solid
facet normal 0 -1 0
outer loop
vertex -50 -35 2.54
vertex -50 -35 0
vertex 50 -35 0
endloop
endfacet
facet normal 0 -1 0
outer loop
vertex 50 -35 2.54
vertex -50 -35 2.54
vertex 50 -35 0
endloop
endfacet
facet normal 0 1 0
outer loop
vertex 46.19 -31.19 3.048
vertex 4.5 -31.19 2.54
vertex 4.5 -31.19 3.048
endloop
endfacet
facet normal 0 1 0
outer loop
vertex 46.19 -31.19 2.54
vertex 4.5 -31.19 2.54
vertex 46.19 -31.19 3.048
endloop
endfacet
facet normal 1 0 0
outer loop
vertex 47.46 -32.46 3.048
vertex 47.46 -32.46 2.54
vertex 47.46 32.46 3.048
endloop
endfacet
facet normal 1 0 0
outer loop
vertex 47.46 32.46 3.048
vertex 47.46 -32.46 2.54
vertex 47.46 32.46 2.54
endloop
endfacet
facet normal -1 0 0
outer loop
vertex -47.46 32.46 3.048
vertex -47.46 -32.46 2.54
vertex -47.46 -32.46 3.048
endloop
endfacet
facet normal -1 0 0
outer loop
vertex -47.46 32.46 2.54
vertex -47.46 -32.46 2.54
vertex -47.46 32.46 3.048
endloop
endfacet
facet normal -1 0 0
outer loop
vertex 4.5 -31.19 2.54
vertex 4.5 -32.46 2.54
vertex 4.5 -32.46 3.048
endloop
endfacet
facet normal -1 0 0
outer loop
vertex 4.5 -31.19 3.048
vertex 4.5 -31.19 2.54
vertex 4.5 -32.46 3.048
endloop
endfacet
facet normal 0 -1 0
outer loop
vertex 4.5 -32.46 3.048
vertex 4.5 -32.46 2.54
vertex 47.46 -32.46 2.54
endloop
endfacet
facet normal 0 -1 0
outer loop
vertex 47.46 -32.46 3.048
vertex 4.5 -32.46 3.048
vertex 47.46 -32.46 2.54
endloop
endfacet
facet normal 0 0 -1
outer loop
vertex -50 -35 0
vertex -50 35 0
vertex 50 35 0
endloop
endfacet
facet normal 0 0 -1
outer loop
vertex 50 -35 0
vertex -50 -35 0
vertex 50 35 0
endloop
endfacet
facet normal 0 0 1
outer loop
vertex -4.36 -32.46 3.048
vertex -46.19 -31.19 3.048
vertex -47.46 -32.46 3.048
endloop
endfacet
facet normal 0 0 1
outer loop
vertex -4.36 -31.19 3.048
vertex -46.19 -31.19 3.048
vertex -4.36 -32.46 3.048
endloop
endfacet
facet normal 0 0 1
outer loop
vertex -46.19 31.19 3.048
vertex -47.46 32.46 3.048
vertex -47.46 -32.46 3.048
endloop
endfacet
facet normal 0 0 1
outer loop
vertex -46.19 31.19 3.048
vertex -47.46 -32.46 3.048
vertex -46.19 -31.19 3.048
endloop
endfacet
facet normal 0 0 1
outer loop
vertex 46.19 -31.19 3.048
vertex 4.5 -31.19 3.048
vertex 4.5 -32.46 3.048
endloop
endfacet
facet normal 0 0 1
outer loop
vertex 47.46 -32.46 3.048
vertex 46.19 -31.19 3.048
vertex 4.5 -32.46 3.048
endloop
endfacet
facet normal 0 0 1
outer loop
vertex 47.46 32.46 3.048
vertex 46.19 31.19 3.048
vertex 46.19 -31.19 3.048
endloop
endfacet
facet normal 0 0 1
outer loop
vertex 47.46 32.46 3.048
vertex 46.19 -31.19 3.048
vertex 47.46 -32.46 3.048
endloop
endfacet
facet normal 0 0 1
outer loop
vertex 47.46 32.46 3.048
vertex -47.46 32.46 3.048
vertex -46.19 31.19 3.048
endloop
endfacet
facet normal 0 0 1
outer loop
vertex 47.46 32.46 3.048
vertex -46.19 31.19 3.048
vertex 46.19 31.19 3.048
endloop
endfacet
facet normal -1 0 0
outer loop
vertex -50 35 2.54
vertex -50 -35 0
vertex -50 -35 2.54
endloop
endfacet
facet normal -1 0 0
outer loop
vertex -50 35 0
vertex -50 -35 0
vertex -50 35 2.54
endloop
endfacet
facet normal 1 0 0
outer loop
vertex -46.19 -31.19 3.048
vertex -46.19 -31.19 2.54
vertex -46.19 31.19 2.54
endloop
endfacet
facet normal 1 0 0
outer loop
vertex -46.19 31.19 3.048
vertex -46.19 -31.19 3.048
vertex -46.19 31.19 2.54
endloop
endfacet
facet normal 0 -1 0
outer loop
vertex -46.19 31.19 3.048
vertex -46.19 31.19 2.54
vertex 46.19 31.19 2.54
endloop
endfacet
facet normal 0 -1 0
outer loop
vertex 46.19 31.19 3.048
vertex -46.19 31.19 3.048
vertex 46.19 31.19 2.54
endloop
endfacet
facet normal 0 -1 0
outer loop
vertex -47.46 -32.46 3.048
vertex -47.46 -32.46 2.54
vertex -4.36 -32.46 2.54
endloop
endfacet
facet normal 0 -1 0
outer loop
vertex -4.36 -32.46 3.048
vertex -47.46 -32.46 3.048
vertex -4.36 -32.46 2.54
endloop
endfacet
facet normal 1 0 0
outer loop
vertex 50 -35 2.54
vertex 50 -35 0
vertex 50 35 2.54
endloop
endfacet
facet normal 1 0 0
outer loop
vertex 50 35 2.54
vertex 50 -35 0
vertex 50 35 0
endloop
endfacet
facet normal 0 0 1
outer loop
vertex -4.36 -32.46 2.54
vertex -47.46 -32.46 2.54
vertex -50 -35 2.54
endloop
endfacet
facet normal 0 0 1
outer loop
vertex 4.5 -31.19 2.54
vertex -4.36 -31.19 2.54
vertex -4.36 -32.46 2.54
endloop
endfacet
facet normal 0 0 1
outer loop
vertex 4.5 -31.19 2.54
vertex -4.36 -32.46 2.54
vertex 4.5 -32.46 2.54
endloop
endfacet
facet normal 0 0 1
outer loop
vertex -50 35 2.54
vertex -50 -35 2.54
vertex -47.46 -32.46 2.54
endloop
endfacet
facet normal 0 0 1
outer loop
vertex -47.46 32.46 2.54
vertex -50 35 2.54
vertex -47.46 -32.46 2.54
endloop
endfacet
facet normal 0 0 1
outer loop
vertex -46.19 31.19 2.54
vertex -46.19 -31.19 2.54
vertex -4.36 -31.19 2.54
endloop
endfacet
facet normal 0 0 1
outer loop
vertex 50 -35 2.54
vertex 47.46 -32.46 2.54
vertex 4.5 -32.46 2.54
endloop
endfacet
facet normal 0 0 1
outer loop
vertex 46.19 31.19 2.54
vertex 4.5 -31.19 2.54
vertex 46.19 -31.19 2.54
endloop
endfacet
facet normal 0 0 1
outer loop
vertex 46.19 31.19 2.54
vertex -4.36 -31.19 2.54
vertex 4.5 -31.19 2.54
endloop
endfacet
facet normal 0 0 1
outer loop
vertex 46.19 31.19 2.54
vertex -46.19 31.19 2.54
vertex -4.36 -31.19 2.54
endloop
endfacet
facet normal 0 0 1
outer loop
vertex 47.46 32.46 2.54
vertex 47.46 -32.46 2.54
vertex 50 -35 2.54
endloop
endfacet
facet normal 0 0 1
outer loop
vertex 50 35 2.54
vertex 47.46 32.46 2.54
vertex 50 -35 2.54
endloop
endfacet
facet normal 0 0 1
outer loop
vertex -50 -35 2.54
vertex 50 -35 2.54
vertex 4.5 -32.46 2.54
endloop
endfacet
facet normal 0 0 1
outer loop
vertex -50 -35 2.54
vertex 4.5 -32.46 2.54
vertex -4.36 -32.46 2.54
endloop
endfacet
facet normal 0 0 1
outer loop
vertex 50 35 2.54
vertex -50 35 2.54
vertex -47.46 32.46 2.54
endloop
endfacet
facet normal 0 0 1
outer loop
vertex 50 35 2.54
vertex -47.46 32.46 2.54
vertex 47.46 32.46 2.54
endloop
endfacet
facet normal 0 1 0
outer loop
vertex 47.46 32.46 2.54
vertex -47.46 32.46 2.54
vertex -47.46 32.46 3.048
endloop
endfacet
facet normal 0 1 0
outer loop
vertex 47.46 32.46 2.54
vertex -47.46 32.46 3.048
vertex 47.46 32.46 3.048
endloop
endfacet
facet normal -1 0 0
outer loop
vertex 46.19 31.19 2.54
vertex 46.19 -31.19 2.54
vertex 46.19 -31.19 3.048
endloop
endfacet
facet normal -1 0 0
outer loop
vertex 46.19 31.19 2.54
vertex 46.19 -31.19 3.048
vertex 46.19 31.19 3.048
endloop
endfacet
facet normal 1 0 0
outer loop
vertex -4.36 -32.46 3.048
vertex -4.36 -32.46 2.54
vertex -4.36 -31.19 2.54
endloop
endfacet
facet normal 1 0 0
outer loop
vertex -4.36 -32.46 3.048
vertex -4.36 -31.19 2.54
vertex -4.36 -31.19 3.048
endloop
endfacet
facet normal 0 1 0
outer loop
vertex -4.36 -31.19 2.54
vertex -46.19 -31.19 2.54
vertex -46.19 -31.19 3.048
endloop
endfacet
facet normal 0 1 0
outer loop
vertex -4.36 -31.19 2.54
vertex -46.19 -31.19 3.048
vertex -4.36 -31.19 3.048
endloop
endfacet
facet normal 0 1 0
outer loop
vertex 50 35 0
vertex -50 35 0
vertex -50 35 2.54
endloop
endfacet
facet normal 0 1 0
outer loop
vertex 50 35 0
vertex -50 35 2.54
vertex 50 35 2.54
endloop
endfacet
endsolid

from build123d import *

# Parameters (mm, degrees)
F0_W     = 100
F0_H     = 70
F1_DEPTH = 2.54
F2_W     = 94.92
F2_H     = 64.92
F2_W_2   = 92.38
F2_H_2   = 62.38
F3_DEPTH = 0.508
F4_W     = 8.86
F4_H     = 0.508
F5_DEPTH = 25.4


with BuildPart() as f1:
    # F0 (on Top) → F1 (new body)
    with BuildSketch(Plane.XY):
        Rectangle(F0_W, F0_H)
    extrude(amount=F1_DEPTH)

    # F2 (on face) → F3 (join)
    with BuildSketch(Plane.XY.offset(2.54)):
        Rectangle(F2_W, F2_H)
        Rectangle(F2_W_2, F2_H_2, mode=Mode.SUBTRACT)
    extrude(amount=F3_DEPTH)

    # F4 (on face) → F5 (cut)
    with BuildSketch(Plane.XZ.offset(32.46)):
        with Locations((0.07, 2.794)):
            Rectangle(F4_W, F4_H)
    extrude(amount=-F5_DEPTH, mode=Mode.SUBTRACT)


solid = f1.part
